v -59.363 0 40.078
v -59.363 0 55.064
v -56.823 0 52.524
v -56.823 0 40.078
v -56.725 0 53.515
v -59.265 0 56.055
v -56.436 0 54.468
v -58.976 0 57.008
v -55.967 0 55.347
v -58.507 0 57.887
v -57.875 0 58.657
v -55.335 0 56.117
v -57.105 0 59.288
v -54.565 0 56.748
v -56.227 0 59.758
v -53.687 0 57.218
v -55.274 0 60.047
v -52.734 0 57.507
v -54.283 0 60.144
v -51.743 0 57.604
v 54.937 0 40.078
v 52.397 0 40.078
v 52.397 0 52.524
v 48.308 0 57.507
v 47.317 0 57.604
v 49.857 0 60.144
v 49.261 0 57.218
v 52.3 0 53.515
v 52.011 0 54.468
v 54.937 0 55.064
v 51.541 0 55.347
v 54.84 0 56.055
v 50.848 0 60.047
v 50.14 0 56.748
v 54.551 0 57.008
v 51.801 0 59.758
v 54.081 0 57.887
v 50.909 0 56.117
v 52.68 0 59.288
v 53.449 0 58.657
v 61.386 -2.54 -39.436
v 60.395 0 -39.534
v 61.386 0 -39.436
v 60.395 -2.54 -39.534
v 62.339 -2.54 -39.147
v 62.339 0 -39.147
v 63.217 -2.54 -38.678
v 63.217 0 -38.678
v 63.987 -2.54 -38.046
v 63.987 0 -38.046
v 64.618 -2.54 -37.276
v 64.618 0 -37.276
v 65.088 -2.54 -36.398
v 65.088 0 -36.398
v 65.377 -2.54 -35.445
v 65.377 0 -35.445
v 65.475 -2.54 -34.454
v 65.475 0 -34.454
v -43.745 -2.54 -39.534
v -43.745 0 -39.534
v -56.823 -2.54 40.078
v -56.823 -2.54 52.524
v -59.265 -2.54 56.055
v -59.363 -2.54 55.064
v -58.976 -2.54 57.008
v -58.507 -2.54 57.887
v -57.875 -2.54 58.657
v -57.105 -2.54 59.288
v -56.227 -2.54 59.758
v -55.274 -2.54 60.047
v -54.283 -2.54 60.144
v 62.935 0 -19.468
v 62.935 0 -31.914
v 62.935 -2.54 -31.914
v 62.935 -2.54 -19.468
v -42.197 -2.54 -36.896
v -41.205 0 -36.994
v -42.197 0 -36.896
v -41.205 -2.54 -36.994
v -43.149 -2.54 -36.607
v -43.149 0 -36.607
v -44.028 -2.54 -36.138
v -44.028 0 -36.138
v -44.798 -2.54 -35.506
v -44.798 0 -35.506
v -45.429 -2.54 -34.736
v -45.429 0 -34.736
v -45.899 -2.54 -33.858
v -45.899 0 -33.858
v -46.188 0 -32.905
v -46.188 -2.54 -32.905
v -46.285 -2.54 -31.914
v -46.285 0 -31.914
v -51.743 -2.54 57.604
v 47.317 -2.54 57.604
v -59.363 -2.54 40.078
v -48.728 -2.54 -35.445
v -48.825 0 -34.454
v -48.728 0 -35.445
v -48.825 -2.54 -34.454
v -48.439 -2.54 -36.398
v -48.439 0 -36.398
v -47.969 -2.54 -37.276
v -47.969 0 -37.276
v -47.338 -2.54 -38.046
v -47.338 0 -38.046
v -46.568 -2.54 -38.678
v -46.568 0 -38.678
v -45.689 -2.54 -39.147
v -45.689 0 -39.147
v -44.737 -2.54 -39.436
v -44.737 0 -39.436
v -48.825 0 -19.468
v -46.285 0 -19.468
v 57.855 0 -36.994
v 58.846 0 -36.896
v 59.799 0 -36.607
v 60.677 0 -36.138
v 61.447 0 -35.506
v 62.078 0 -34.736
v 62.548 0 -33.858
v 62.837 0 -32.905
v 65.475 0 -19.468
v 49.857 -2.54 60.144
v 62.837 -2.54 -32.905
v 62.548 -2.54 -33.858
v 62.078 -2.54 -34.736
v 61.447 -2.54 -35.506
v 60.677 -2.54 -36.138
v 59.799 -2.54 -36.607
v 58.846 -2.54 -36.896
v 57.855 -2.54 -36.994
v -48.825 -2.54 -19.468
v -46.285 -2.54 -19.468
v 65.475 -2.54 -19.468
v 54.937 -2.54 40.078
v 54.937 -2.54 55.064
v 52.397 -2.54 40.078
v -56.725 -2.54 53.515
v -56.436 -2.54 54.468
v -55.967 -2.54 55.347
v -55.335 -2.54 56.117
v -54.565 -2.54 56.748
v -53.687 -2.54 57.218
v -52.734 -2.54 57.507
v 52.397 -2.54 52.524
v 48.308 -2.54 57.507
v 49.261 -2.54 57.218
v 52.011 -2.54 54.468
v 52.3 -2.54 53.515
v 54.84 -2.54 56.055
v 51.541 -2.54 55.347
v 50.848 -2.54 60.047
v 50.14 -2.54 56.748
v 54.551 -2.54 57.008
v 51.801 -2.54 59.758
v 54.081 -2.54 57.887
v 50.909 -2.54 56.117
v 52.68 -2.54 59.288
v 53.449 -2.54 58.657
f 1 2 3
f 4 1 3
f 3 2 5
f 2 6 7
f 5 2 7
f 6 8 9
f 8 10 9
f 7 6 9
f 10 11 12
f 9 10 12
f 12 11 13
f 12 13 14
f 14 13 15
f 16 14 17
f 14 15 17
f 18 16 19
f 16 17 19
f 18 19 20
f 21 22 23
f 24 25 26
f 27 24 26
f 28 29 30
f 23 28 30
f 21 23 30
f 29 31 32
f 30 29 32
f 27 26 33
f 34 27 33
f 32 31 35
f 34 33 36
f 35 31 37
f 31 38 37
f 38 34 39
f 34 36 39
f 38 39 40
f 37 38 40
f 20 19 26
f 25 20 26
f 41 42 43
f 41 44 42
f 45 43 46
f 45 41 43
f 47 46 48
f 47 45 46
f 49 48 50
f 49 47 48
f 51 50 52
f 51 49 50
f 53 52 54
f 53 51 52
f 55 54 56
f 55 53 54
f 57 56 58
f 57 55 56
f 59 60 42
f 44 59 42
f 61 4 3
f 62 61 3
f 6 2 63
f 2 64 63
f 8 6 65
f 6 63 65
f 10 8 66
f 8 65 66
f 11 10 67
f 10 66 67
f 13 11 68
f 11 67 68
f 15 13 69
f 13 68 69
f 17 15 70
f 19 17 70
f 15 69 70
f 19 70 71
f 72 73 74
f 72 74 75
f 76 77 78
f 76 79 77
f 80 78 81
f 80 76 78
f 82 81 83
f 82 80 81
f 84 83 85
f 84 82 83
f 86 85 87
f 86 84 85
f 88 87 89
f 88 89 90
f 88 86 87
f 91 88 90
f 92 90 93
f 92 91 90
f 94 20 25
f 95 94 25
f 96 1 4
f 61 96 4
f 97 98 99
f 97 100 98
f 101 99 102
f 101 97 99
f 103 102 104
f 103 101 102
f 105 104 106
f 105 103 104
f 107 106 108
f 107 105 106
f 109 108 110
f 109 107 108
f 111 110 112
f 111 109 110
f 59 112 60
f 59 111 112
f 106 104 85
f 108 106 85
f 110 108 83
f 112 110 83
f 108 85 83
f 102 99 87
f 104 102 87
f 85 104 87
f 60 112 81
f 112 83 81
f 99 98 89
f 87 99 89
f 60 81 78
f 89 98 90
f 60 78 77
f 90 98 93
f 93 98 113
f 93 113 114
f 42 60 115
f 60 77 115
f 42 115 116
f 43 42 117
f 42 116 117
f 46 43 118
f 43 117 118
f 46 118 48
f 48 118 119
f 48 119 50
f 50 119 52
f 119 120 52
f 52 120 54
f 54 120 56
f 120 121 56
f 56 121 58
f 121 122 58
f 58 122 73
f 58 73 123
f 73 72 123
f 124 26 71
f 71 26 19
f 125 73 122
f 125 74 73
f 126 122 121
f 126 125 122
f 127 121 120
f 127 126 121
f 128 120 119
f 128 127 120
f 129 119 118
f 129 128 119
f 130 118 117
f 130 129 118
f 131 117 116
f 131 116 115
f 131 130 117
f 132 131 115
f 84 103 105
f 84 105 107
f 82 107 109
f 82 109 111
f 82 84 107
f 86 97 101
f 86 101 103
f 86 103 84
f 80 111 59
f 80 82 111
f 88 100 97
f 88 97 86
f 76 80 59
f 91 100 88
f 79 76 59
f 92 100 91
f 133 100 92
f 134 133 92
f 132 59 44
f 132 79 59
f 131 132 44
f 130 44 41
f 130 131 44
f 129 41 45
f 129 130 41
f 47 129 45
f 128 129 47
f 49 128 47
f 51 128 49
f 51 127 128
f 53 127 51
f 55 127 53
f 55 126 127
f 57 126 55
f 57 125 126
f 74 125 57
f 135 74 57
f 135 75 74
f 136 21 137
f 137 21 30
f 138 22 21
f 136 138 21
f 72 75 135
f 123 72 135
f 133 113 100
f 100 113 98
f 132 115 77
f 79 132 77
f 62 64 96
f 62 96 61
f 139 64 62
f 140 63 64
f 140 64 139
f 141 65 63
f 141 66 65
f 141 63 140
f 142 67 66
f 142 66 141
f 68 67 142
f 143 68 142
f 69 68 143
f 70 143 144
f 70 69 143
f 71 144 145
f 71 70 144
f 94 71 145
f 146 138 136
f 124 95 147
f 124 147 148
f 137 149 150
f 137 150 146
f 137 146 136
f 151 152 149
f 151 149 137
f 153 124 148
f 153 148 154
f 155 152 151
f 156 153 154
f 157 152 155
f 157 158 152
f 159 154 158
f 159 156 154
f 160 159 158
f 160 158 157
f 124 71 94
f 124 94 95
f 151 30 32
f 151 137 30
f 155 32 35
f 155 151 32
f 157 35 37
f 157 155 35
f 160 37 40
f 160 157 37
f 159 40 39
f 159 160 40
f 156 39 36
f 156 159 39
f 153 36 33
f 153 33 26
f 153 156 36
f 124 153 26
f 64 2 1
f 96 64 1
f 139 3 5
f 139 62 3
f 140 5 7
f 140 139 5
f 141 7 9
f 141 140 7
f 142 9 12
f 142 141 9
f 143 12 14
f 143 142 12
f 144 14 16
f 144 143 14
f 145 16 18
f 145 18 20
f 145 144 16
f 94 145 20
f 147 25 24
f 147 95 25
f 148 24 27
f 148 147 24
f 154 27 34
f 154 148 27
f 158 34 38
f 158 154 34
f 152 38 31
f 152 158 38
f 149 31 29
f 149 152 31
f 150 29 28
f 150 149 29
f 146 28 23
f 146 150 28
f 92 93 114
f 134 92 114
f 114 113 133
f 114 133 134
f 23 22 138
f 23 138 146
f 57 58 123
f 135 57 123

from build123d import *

# Parameters (mm, degrees)
F0_W     = 2.54
F0_H     = 17.526
F1_DEPTH = 2.54
F2_R     = 5.08


with BuildPart() as f1:
    # F0 (on Front) → F1 (new body)
    with BuildSketch(Plane.XZ):
        Polygon((-59.362726, 60.144404), (-59.362726, 57.604404), (-56.822726, 57.604404), (52.397274, 57.604404), (54.937274, 57.604404), (54.937274, 60.144404), align=None)
        with Locations((-58.092726, 48.841404)):
            Rectangle(F0_W, F0_H)
        with Locations((53.667274, 48.841404)):
            Rectangle(F0_W, F0_H)
        with Locations((-47.555447, -28.230649)):
            Rectangle(F0_W, F0_H)
        Polygon((-46.285447, -36.993649), (-48.825447, -36.993649), (-48.825447, -39.533649), (65.474553, -39.533649), (65.474553, -36.993649), (62.934553, -36.993649), align=None)
        with Locations((64.204553, -28.230649)):
            Rectangle(F0_W, F0_H)
    extrude(amount=F1_DEPTH)

    # F2
    f2_edges = [f1.edges().sort_by_distance(p)[0] for p in [
        (-46.285447, -1.27, -36.993649),
        (-48.825447, -1.27, -39.533649),
        (62.934553, -1.27, -36.993649),
        (65.474553, -1.27, -39.533649),
        (52.397274, -1.27, 57.604404),
        (54.937274, -1.27, 60.144404),
        (-56.822726, -1.27, 57.604404),
        (-59.362726, -1.27, 60.144404),
    ]]
    fillet(f2_edges, radius=F2_R)


solid = f1.part
